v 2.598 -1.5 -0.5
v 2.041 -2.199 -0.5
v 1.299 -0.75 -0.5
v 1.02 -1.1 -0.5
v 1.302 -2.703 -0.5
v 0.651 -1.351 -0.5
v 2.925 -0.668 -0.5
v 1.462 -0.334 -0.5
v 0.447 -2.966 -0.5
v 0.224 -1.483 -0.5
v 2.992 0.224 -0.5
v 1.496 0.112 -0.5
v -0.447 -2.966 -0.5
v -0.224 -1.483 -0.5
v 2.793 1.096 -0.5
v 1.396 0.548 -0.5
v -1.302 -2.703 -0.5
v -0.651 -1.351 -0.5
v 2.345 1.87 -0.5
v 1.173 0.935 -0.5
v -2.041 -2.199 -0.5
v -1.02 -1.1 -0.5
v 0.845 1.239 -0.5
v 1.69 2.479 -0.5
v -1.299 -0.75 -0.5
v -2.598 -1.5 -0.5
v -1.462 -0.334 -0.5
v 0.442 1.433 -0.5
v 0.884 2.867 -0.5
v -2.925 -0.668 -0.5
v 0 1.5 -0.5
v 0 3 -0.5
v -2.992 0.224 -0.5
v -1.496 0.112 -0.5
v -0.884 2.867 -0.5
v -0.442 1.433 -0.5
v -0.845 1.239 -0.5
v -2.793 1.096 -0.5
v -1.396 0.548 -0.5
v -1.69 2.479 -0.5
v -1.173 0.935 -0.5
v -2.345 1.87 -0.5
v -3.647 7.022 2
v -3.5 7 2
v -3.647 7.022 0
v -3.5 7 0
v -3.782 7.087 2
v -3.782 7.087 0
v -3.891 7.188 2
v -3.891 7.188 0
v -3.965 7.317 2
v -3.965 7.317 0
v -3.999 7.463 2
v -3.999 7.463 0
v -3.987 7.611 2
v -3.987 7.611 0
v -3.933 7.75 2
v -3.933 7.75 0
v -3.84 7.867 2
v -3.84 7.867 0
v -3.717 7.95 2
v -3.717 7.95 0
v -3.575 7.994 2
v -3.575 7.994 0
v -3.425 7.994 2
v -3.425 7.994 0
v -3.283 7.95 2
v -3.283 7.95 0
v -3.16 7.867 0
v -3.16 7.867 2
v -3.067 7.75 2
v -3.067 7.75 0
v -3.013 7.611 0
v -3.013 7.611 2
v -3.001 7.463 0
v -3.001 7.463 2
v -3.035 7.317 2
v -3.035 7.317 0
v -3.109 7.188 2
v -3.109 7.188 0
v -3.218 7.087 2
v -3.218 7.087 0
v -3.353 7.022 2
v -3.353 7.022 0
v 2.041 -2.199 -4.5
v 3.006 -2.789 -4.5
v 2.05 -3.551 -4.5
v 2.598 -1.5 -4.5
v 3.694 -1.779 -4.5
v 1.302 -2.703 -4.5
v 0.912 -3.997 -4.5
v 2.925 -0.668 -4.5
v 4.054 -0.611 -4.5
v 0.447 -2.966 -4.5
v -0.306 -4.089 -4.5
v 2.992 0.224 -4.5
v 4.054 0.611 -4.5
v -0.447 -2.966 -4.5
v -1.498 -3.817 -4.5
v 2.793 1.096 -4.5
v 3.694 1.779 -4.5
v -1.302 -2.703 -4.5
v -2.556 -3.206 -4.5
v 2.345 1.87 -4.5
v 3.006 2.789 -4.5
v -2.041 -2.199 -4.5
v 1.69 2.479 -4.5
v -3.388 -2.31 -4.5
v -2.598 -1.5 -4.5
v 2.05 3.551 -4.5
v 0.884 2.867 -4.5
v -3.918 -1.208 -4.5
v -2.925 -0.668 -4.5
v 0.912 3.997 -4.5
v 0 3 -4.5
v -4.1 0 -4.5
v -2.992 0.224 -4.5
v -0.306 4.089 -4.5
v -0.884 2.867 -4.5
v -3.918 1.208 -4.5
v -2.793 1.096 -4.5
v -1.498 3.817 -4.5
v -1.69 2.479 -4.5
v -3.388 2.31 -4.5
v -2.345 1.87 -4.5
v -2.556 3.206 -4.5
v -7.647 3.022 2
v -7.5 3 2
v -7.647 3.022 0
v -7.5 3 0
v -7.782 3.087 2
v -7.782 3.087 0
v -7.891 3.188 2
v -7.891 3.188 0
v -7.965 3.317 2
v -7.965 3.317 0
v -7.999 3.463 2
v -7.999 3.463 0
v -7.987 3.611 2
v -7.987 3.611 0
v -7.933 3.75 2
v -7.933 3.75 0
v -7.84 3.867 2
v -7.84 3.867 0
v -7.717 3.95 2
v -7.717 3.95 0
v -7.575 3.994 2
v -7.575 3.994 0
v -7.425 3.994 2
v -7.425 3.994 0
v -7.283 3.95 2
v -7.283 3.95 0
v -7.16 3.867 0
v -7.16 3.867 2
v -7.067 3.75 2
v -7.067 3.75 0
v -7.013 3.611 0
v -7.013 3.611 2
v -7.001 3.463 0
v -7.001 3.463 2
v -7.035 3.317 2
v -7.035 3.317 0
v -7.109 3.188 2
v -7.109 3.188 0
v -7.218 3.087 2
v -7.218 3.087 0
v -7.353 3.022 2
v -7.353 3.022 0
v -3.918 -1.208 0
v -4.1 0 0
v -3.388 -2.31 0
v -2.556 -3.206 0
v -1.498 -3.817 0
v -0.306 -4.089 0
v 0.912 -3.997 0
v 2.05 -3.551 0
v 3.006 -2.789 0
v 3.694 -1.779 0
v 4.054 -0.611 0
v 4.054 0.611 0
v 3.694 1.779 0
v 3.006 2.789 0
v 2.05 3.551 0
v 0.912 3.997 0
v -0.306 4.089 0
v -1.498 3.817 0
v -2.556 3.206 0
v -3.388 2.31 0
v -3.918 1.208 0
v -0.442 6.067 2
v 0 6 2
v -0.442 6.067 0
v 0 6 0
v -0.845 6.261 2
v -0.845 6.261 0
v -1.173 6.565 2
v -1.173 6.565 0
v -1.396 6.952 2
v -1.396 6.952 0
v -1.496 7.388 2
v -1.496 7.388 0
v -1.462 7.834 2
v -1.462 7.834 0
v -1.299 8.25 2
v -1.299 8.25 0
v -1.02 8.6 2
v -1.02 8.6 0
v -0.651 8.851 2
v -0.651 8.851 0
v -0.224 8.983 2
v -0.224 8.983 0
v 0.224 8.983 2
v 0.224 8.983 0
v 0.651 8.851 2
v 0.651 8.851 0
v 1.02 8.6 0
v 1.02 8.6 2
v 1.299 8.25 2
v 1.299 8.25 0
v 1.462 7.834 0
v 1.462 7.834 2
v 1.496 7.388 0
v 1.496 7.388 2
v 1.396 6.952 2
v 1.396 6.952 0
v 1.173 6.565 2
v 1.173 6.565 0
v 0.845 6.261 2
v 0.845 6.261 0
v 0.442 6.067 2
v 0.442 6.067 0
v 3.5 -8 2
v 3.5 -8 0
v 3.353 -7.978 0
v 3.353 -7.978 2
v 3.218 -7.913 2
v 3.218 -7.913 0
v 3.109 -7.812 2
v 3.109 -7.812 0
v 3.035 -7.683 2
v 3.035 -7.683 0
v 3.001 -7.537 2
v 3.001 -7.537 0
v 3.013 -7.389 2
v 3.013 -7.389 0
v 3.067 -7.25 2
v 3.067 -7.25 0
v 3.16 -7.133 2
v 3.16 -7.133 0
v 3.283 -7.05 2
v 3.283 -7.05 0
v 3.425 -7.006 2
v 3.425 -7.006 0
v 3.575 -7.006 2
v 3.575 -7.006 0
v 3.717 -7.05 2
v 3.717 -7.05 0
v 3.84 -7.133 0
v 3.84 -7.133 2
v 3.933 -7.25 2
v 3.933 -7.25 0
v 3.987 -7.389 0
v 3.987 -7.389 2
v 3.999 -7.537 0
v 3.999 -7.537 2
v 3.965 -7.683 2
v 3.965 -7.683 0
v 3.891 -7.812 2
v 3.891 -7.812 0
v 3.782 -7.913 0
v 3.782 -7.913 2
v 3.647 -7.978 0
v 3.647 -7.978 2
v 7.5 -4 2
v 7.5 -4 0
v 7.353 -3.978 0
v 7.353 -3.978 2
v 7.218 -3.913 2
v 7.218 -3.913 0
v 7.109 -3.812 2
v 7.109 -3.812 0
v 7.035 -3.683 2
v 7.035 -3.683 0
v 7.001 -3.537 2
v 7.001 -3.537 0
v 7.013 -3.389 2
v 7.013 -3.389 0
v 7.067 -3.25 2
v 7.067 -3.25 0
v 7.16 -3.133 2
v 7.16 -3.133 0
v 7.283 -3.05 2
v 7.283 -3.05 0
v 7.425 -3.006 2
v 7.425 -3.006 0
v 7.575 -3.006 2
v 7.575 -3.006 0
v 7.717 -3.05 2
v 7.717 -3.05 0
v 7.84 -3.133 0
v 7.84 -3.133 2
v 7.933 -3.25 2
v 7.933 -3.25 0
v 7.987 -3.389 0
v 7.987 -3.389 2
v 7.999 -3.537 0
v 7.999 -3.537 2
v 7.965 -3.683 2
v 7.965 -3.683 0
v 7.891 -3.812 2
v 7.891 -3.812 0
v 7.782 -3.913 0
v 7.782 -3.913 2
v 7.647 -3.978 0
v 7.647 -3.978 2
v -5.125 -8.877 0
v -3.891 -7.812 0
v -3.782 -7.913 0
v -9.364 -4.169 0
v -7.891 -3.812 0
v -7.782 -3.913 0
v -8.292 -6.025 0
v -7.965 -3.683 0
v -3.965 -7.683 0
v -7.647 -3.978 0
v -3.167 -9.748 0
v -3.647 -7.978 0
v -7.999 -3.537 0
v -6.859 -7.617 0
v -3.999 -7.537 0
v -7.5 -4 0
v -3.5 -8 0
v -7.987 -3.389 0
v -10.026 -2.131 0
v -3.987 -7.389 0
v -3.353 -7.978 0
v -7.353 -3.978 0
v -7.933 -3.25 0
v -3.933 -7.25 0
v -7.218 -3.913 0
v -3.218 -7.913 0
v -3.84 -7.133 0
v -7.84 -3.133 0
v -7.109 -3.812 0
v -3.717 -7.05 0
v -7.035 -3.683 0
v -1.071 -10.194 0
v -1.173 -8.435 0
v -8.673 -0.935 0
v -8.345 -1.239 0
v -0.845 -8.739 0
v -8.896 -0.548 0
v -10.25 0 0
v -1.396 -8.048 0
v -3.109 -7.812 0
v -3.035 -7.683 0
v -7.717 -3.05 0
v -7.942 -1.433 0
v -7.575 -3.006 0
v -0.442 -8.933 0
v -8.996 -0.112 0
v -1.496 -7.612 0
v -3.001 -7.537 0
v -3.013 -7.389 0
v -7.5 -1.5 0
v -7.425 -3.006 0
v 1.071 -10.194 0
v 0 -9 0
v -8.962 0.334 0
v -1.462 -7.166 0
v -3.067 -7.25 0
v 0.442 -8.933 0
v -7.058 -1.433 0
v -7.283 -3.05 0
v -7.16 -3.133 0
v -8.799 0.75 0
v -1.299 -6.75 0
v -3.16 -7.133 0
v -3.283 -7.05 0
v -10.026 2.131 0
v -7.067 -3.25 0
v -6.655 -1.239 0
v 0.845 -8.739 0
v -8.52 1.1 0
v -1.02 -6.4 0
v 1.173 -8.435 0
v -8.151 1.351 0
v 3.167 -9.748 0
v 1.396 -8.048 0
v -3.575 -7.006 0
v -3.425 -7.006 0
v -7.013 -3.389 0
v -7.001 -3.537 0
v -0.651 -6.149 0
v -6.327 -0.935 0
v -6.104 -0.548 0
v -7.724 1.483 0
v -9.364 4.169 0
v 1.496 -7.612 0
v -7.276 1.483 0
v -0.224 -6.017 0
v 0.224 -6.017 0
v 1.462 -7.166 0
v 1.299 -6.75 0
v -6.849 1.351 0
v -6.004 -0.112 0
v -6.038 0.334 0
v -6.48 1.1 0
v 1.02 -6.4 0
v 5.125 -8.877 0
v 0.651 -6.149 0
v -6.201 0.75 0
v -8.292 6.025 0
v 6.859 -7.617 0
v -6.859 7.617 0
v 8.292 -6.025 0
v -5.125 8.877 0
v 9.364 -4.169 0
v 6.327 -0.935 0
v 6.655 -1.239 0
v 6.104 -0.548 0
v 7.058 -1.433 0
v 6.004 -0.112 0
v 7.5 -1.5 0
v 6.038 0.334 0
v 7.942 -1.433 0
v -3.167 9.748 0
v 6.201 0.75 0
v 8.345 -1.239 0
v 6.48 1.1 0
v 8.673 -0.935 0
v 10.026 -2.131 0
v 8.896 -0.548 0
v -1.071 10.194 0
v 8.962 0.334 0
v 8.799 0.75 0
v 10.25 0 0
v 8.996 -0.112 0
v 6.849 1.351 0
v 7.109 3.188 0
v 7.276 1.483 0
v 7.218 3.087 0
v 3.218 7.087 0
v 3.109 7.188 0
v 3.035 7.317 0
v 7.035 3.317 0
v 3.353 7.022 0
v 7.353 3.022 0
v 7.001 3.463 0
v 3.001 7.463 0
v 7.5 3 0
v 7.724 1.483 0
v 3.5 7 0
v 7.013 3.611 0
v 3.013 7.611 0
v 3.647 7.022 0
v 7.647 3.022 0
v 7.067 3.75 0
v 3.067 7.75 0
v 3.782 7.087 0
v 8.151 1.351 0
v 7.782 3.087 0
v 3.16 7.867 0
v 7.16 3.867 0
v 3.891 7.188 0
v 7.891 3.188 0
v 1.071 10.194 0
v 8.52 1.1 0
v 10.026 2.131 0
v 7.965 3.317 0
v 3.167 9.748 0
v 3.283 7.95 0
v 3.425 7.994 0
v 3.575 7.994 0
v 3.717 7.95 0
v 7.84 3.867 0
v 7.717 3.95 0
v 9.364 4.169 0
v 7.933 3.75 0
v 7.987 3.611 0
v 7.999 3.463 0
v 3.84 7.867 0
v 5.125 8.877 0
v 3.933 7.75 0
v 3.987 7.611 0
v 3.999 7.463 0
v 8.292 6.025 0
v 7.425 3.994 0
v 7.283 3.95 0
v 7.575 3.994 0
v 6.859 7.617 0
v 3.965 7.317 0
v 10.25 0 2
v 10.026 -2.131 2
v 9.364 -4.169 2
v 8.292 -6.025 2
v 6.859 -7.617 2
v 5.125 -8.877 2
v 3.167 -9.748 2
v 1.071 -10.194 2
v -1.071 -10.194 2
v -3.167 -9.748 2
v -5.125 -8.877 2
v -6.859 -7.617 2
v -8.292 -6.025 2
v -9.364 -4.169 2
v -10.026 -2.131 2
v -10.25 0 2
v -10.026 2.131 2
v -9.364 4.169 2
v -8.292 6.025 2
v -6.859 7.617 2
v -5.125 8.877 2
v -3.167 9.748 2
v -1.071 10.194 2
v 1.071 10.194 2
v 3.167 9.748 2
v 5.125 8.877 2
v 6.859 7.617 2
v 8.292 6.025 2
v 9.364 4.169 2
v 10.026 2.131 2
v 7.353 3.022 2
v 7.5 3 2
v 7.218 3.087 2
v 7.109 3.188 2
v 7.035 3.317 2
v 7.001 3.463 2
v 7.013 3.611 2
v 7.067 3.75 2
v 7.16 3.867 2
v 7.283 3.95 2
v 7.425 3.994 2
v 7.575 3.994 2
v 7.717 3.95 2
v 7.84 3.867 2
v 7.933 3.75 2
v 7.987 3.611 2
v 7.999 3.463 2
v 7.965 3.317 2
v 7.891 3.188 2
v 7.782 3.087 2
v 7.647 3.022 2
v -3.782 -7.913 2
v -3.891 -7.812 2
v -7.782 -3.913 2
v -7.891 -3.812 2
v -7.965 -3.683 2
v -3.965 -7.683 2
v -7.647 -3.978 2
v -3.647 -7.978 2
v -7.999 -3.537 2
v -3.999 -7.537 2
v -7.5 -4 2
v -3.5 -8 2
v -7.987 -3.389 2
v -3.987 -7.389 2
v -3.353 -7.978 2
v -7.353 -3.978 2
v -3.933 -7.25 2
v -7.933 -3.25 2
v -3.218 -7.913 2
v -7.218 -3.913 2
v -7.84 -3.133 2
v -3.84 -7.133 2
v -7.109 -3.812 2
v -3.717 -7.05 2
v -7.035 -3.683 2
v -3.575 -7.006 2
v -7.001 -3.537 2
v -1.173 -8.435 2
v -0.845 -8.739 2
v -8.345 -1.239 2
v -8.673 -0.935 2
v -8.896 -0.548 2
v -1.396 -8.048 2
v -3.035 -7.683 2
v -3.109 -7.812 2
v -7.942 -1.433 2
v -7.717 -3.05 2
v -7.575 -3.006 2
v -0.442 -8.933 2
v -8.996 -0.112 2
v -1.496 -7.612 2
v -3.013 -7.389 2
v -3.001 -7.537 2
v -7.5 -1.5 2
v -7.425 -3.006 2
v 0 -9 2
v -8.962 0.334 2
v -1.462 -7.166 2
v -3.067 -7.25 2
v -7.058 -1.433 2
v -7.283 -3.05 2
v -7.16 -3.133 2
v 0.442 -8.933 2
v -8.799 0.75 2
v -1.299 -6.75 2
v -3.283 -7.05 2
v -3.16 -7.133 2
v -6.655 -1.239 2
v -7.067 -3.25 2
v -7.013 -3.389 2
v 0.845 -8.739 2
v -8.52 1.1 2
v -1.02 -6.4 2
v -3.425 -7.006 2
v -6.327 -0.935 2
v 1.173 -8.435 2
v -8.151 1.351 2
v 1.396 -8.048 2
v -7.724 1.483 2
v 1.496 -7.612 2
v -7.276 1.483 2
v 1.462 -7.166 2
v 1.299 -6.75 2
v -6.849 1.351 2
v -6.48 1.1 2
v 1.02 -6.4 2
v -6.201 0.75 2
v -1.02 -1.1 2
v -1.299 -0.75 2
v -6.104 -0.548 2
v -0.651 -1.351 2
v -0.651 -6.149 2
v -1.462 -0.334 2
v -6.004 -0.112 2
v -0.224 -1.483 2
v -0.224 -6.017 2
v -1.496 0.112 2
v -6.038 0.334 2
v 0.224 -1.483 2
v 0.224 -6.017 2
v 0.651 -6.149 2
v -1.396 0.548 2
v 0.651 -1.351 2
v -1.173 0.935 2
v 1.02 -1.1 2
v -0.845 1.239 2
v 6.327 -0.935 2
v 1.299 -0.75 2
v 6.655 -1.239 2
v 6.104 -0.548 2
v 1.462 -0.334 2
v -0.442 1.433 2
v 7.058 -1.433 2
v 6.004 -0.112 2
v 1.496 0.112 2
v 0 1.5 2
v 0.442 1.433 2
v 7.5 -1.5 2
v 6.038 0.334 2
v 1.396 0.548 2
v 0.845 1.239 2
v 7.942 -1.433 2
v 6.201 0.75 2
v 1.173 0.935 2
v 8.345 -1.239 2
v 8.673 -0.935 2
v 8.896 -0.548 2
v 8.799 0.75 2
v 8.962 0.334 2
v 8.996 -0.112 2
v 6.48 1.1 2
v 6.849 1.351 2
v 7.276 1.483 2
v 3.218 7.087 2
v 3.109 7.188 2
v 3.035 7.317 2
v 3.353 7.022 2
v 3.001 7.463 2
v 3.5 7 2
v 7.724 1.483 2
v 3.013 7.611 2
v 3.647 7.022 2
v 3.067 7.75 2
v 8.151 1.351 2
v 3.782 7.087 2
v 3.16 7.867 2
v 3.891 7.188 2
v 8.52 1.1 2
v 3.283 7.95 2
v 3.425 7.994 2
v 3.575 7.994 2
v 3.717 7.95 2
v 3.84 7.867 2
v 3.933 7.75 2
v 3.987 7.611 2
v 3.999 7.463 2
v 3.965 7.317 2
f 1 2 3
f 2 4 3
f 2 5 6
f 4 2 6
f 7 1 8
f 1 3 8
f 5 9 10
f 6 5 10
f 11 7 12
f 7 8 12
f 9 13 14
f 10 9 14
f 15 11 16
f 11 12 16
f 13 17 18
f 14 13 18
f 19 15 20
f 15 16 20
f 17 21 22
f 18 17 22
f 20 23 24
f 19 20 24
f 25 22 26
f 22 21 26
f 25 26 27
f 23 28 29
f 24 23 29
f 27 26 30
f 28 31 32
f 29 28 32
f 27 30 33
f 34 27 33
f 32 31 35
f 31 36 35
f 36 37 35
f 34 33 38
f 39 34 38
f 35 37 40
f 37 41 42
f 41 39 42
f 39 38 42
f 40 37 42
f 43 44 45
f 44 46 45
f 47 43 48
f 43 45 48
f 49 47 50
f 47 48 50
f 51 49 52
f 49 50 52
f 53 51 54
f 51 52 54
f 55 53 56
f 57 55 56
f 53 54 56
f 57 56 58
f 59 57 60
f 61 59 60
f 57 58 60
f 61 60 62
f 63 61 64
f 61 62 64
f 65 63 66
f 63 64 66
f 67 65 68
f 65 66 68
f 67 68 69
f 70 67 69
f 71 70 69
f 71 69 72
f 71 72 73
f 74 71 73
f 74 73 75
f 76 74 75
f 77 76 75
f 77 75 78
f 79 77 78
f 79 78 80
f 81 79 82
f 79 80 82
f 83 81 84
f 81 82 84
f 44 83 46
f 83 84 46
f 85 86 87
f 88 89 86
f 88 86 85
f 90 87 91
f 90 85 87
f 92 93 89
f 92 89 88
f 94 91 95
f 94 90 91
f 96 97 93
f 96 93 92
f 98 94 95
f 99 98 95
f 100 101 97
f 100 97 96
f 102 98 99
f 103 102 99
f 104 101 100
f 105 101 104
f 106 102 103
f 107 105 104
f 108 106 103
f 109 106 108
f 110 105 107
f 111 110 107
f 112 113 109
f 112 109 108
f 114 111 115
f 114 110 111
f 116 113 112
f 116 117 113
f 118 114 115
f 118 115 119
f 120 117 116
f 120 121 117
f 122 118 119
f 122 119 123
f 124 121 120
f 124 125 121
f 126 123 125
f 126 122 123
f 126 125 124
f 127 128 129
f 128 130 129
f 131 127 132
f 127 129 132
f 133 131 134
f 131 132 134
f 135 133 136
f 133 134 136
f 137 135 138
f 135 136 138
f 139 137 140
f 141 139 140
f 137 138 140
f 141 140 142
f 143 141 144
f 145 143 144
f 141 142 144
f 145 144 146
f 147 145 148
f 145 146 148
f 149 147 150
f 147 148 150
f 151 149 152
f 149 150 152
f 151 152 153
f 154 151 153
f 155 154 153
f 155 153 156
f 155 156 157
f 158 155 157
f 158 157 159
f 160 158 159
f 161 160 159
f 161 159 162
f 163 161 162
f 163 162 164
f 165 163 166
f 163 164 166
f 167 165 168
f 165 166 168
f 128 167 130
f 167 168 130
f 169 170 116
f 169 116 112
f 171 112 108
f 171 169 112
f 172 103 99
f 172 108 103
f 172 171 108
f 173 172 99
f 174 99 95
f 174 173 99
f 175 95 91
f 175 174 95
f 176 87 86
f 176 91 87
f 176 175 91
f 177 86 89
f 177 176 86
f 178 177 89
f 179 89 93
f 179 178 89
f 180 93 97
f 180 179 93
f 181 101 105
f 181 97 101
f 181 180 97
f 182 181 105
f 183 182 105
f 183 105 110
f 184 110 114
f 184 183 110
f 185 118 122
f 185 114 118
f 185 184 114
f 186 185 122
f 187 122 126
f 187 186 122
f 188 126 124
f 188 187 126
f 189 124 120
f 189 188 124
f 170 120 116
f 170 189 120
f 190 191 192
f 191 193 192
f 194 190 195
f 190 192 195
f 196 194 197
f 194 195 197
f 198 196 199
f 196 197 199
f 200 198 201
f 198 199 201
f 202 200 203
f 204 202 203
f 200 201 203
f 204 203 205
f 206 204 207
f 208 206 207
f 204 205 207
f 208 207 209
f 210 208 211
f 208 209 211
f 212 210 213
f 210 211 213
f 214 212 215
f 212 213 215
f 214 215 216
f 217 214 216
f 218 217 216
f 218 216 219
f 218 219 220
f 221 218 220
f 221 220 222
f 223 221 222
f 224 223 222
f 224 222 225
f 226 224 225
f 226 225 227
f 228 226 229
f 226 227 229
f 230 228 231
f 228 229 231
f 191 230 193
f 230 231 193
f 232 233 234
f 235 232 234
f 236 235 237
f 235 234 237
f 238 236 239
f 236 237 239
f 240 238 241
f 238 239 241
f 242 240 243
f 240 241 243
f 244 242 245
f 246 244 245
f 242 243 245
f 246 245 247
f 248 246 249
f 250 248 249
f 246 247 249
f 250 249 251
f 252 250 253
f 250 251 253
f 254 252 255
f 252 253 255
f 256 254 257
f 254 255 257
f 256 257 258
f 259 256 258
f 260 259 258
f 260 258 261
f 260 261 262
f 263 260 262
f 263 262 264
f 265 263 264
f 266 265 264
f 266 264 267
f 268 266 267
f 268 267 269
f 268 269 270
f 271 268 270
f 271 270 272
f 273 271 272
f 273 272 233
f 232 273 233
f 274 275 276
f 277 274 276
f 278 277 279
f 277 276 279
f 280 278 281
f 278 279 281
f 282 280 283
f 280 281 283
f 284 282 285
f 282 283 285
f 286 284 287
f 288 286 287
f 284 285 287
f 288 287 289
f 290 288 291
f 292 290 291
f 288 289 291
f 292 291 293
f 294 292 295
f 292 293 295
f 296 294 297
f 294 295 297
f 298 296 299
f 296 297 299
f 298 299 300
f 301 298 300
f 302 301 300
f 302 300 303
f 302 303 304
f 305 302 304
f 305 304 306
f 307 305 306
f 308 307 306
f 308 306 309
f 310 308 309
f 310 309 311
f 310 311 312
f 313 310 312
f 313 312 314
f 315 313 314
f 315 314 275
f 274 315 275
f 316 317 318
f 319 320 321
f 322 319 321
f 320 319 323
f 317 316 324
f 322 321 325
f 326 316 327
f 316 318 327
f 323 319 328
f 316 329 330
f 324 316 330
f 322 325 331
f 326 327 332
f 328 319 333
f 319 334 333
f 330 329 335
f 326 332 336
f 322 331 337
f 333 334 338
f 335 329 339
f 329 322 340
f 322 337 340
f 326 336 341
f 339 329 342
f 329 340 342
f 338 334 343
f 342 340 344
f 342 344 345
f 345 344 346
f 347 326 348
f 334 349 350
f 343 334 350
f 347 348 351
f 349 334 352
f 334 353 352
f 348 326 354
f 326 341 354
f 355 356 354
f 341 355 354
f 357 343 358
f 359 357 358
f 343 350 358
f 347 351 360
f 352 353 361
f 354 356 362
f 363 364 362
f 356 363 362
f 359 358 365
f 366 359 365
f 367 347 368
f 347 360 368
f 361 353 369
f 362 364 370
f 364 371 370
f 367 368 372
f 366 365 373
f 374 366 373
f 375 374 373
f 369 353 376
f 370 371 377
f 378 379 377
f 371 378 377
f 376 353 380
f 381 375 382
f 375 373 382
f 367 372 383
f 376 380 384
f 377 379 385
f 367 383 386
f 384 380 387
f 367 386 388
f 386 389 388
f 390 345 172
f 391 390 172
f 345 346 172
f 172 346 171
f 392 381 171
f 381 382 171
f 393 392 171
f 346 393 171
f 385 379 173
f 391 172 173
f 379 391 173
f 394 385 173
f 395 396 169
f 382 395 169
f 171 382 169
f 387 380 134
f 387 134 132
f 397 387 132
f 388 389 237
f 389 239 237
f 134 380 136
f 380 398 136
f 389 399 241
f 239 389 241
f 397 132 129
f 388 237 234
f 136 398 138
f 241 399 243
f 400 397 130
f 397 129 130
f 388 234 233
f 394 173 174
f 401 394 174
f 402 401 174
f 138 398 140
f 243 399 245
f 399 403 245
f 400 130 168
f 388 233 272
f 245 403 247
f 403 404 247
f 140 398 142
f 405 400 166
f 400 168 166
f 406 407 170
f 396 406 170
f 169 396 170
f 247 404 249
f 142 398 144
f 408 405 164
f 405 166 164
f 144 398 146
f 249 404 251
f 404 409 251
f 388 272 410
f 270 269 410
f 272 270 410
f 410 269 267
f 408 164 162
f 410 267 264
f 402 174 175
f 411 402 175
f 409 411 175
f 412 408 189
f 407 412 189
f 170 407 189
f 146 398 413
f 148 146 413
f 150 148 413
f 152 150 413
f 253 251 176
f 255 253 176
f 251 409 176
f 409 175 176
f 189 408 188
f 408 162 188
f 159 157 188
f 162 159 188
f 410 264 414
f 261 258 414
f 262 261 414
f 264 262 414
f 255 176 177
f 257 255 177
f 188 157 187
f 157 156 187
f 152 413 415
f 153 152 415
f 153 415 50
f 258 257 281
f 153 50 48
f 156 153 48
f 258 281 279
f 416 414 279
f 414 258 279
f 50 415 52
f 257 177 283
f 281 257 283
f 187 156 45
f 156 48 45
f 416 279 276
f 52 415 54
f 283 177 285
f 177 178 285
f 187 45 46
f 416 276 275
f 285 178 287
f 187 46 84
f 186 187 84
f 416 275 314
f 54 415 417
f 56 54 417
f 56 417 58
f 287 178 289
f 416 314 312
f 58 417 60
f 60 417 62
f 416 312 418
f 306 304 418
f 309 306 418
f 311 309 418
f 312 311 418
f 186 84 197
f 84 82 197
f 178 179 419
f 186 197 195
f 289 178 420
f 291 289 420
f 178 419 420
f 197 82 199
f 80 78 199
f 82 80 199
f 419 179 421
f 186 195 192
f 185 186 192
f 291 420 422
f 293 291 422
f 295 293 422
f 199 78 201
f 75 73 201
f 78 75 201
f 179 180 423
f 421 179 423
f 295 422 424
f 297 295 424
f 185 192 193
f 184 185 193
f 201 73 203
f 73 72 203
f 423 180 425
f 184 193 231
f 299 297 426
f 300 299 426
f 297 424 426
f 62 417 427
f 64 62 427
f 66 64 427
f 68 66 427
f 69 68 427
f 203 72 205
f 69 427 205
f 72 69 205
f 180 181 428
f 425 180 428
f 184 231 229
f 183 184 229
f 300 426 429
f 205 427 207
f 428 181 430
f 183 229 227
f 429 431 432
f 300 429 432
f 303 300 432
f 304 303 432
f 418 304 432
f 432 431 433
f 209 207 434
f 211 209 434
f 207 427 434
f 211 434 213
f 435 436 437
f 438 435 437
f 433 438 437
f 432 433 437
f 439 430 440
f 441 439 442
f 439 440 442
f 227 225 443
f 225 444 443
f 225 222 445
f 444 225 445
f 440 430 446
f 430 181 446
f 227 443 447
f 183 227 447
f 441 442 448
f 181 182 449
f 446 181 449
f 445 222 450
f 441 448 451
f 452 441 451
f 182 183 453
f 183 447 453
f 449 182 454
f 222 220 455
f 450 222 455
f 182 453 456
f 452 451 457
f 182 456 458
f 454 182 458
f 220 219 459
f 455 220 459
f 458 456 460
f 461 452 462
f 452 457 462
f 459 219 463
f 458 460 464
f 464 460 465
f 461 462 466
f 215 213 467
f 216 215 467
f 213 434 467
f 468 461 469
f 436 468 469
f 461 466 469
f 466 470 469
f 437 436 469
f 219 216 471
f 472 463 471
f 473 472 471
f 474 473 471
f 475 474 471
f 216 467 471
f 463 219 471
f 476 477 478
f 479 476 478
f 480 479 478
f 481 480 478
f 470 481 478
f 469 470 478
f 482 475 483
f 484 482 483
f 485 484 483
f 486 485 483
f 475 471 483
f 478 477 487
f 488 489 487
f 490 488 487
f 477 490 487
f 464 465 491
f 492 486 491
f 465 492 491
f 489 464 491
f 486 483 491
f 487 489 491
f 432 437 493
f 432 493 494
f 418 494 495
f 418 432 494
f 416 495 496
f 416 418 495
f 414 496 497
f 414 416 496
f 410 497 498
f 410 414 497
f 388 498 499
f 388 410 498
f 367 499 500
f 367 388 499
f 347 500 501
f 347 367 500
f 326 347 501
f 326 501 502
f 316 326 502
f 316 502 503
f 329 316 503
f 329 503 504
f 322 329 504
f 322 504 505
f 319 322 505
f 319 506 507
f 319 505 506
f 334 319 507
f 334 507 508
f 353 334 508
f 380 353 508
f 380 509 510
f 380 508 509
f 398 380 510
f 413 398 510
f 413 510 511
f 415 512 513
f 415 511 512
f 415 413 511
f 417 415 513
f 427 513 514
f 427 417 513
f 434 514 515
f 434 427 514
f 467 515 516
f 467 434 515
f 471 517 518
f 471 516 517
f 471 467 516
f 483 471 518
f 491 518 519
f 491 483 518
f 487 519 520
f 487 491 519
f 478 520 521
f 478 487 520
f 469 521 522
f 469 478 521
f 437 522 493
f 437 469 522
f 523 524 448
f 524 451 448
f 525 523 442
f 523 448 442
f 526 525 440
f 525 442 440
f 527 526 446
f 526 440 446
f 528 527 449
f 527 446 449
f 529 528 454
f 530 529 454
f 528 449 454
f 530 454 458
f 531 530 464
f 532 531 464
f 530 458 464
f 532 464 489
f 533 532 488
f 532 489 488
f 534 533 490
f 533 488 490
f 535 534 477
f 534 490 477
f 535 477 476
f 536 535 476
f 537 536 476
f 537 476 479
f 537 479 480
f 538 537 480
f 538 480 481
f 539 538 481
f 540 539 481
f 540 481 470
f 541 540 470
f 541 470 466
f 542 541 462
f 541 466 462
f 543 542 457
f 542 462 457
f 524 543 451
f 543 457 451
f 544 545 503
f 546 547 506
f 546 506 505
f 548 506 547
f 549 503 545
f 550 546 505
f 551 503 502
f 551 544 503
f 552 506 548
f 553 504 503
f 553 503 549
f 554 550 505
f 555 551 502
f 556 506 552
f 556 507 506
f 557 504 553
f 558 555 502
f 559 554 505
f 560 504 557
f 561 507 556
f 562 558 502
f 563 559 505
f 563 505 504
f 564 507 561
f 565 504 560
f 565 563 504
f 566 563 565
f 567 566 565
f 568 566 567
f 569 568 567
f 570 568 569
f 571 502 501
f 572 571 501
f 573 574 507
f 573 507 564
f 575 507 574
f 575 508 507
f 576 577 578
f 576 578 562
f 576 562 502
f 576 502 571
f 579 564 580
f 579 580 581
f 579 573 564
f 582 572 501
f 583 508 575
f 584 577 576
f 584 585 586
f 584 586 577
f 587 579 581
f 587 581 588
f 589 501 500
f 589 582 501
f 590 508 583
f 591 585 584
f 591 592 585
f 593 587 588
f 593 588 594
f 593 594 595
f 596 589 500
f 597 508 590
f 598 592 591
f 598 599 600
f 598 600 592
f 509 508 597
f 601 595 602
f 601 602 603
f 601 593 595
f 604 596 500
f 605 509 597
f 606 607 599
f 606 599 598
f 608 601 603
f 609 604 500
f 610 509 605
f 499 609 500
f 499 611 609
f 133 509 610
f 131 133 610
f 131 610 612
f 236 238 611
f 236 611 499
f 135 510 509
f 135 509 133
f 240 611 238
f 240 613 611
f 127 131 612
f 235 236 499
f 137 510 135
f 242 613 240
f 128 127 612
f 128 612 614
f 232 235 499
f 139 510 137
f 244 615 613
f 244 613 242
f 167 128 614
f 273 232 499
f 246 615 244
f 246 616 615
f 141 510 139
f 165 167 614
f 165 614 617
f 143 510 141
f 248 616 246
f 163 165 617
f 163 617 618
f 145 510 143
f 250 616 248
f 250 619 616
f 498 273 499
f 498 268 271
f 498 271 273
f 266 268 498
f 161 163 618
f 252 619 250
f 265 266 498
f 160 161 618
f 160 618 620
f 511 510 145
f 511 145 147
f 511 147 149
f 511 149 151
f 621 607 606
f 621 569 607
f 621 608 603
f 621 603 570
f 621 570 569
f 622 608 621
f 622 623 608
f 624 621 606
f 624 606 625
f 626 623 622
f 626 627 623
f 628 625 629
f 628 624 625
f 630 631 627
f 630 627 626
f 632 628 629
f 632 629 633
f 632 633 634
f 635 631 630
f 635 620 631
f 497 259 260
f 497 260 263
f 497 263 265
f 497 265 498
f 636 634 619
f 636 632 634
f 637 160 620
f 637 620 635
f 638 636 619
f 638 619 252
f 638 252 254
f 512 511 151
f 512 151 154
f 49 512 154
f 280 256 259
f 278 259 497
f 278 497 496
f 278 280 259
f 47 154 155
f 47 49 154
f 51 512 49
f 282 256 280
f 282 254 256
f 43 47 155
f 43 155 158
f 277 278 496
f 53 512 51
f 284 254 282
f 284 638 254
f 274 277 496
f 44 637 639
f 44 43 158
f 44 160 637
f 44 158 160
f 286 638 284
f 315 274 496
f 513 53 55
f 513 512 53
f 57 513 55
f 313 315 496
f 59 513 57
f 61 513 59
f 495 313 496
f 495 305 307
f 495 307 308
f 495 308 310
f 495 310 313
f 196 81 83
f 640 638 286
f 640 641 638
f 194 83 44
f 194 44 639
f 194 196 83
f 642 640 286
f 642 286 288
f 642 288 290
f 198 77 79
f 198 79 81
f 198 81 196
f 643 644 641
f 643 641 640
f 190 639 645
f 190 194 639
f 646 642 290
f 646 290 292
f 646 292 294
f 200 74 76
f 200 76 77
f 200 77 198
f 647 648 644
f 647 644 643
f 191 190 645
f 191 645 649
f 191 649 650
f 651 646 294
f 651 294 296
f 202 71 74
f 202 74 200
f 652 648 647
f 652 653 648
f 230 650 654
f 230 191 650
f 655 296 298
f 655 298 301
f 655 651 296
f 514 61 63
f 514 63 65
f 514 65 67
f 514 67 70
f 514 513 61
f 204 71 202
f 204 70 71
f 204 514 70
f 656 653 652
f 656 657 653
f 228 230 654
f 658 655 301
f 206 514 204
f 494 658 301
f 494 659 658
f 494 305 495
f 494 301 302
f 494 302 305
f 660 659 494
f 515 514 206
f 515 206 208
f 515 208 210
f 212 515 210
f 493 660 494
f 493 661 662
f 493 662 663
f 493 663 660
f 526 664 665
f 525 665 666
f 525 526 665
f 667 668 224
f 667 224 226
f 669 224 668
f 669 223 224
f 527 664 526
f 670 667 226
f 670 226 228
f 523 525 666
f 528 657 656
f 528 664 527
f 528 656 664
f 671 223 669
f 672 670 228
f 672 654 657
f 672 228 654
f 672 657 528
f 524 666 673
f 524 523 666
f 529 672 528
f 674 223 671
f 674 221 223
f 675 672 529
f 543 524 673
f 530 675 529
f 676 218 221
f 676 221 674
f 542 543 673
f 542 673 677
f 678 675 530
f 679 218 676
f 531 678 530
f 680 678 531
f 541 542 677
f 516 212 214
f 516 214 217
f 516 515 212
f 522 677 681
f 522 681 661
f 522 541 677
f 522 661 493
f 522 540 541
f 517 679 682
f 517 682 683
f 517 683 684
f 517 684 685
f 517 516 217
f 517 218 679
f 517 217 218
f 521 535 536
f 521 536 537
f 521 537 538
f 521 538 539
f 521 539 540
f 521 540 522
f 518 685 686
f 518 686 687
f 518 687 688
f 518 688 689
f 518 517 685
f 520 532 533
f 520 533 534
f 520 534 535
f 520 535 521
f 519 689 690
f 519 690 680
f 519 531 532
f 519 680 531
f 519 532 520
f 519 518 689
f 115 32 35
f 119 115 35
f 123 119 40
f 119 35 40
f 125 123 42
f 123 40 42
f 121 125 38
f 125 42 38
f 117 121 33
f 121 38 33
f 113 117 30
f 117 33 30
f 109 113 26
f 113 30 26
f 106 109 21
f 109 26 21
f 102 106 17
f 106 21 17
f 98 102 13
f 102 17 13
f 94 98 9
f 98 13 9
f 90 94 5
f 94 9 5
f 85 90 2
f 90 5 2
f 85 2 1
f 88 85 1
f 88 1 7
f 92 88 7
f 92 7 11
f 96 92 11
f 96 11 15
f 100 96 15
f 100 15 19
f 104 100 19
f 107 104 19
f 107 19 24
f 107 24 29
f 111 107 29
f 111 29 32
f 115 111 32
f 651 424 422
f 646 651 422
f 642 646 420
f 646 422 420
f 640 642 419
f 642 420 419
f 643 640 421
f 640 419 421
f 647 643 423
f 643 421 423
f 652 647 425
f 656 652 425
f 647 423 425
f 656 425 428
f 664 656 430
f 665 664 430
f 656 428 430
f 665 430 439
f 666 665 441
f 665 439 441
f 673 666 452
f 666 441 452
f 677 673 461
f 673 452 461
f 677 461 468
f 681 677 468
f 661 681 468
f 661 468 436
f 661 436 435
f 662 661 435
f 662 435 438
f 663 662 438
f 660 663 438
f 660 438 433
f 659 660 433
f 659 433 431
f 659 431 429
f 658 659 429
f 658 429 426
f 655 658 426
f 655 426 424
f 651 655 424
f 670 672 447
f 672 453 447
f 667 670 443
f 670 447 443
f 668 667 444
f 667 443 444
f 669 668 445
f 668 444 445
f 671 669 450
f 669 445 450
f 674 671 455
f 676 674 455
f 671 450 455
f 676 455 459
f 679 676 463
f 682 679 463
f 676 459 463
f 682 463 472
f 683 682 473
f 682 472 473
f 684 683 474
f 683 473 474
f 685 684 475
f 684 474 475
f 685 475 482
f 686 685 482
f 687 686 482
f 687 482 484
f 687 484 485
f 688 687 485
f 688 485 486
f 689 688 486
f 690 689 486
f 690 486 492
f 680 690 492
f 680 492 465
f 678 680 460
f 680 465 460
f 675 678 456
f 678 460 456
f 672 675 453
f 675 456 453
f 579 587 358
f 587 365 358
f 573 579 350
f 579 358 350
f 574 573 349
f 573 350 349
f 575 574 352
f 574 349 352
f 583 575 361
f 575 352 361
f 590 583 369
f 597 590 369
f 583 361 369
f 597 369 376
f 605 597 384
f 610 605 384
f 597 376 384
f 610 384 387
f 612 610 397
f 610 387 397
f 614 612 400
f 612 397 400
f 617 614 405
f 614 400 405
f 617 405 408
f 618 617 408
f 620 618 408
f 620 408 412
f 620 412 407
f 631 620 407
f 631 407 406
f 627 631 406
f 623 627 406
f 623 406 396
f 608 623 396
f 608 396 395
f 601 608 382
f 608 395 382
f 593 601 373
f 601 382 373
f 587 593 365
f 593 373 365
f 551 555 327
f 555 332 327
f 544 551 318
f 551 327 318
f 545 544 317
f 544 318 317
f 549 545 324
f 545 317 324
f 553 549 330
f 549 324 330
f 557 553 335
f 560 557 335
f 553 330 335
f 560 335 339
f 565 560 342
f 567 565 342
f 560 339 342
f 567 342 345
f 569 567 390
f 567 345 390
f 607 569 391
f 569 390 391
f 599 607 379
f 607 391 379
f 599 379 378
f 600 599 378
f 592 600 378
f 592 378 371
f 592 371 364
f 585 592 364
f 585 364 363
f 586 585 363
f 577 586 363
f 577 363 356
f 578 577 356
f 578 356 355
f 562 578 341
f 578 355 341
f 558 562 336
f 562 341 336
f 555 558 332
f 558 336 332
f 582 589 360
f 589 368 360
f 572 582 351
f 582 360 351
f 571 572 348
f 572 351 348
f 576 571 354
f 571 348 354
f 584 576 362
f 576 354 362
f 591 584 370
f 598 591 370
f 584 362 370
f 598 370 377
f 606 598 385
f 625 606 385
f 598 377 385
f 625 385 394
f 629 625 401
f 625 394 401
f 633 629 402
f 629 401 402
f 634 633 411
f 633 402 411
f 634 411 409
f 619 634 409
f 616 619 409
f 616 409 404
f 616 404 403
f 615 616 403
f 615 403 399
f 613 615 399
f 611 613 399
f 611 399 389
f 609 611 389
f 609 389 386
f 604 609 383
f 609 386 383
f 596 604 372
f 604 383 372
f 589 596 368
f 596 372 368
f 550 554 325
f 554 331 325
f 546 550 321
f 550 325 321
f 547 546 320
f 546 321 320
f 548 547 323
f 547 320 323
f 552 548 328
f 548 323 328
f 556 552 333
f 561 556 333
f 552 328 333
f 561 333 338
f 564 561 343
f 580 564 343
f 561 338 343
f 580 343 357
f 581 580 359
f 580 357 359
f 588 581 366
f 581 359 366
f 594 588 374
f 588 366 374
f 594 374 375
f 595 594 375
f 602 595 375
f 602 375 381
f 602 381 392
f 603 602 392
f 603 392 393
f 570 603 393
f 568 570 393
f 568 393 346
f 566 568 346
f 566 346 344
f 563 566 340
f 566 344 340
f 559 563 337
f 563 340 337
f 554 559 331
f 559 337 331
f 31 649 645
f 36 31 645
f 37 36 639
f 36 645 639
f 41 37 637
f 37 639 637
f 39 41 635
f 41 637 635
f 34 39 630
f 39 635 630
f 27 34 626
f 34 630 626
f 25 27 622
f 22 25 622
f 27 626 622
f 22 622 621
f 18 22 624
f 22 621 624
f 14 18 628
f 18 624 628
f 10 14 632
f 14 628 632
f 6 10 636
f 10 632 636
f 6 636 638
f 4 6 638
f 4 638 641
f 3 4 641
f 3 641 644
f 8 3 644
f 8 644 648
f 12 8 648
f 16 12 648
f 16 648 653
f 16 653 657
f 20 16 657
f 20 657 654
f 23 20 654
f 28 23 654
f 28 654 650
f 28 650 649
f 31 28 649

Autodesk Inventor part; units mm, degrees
ref_plane "YZ Plane" through (0, 0, 0) normal (1, 0, 0) x (0, 1, 0)
ref_plane "XZ Plane" through (0, 0, 0) normal (0, 1, 0) x (-1, 0, 0)
ref_plane "XY Plane" through (0, 0, 0) normal (0, 0, 1) x (1, 0, 0)
sketch "スケッチ1" plane through (0, 0, 0) normal (0, 0, 1) x (1, 0, 0)
  circle A0 centre (0, 0) radius 10.25
  dimension "d0" = 20.5
extrude "押し出し1" add sketch "スケッチ1" along normal blind 2
sketch "スケッチ2" plane through (0, 0, 0) normal (0, 0, -1) x (-1, 0, 0)
  circle A0 centre (0, 0) radius 4.1
  dimension "d3" = 8.2
extrude "押し出し2" add sketch "スケッチ2" along normal blind 4.5
sketch "スケッチ3" plane through (0, 0, -4.5) normal (0, 0, -1) x (-1, 0, 0)
  point P0 (0, 0)
  point P1 (0, 0)
hole "穴1" at (0, 0, -4.5) direction (0, 0, 1) diameter 3 end through all counterbore diameter 6 counterbore depth 4
sketch "スケッチ4" plane through (0, 0, 2) normal (0, 0, 1) x (1, 0, 0)
  point P0 (0, 0)
  point P1 (7.5, 0)
  point P2 (0, 7.5)
  point P3 (-7.5, 0)
  point P4 (0, -7.5)
  dimension "d13" = 7.5
  dimension "d16" = 360
hole "穴2" at (7.5, 0, 2) at (0, 7.5, 2) at (-7.5, 0, 2) at (0, -7.5, 2) direction (0, 0, -1) diameter 3 end through all
sketch "スケッチ5" plane through (0, 0, 2) normal (0, 0, 1) x (1, 0, 0)
  circle A0 centre (7.5, 0) radius 1.5 projected
  point P0 (0, 0)
  point P1 (7.5, 3.5)
  point P2 (7.5, -3.5)
  point P3 (-3.5, 7.5)
  point P4 (3.5, 7.5)
  point P5 (-7.5, -3.5)
  point P6 (-7.5, 3.5)
  point P7 (3.5, -7.5)
  point P8 (-3.5, -7.5)
  dimension "d25" = 3.5
  dimension "d26" = 3.5
  dimension "d29" = 360
hole "穴3" at (7.5, 3.5, 2) at (7.5, -3.5, 2) at (-3.5, 7.5, 2) at (3.5, 7.5, 2) at (-7.5, -3.5, 2) at (-7.5, 3.5, 2) at (3.5, -7.5, 2) at (-3.5, -7.5, 2) direction (0, 0, -1) diameter 1 end through all
equation "\"d26\" = d25"
properties part number "ServoHorn_Circle" material "ABS プラスチック"
